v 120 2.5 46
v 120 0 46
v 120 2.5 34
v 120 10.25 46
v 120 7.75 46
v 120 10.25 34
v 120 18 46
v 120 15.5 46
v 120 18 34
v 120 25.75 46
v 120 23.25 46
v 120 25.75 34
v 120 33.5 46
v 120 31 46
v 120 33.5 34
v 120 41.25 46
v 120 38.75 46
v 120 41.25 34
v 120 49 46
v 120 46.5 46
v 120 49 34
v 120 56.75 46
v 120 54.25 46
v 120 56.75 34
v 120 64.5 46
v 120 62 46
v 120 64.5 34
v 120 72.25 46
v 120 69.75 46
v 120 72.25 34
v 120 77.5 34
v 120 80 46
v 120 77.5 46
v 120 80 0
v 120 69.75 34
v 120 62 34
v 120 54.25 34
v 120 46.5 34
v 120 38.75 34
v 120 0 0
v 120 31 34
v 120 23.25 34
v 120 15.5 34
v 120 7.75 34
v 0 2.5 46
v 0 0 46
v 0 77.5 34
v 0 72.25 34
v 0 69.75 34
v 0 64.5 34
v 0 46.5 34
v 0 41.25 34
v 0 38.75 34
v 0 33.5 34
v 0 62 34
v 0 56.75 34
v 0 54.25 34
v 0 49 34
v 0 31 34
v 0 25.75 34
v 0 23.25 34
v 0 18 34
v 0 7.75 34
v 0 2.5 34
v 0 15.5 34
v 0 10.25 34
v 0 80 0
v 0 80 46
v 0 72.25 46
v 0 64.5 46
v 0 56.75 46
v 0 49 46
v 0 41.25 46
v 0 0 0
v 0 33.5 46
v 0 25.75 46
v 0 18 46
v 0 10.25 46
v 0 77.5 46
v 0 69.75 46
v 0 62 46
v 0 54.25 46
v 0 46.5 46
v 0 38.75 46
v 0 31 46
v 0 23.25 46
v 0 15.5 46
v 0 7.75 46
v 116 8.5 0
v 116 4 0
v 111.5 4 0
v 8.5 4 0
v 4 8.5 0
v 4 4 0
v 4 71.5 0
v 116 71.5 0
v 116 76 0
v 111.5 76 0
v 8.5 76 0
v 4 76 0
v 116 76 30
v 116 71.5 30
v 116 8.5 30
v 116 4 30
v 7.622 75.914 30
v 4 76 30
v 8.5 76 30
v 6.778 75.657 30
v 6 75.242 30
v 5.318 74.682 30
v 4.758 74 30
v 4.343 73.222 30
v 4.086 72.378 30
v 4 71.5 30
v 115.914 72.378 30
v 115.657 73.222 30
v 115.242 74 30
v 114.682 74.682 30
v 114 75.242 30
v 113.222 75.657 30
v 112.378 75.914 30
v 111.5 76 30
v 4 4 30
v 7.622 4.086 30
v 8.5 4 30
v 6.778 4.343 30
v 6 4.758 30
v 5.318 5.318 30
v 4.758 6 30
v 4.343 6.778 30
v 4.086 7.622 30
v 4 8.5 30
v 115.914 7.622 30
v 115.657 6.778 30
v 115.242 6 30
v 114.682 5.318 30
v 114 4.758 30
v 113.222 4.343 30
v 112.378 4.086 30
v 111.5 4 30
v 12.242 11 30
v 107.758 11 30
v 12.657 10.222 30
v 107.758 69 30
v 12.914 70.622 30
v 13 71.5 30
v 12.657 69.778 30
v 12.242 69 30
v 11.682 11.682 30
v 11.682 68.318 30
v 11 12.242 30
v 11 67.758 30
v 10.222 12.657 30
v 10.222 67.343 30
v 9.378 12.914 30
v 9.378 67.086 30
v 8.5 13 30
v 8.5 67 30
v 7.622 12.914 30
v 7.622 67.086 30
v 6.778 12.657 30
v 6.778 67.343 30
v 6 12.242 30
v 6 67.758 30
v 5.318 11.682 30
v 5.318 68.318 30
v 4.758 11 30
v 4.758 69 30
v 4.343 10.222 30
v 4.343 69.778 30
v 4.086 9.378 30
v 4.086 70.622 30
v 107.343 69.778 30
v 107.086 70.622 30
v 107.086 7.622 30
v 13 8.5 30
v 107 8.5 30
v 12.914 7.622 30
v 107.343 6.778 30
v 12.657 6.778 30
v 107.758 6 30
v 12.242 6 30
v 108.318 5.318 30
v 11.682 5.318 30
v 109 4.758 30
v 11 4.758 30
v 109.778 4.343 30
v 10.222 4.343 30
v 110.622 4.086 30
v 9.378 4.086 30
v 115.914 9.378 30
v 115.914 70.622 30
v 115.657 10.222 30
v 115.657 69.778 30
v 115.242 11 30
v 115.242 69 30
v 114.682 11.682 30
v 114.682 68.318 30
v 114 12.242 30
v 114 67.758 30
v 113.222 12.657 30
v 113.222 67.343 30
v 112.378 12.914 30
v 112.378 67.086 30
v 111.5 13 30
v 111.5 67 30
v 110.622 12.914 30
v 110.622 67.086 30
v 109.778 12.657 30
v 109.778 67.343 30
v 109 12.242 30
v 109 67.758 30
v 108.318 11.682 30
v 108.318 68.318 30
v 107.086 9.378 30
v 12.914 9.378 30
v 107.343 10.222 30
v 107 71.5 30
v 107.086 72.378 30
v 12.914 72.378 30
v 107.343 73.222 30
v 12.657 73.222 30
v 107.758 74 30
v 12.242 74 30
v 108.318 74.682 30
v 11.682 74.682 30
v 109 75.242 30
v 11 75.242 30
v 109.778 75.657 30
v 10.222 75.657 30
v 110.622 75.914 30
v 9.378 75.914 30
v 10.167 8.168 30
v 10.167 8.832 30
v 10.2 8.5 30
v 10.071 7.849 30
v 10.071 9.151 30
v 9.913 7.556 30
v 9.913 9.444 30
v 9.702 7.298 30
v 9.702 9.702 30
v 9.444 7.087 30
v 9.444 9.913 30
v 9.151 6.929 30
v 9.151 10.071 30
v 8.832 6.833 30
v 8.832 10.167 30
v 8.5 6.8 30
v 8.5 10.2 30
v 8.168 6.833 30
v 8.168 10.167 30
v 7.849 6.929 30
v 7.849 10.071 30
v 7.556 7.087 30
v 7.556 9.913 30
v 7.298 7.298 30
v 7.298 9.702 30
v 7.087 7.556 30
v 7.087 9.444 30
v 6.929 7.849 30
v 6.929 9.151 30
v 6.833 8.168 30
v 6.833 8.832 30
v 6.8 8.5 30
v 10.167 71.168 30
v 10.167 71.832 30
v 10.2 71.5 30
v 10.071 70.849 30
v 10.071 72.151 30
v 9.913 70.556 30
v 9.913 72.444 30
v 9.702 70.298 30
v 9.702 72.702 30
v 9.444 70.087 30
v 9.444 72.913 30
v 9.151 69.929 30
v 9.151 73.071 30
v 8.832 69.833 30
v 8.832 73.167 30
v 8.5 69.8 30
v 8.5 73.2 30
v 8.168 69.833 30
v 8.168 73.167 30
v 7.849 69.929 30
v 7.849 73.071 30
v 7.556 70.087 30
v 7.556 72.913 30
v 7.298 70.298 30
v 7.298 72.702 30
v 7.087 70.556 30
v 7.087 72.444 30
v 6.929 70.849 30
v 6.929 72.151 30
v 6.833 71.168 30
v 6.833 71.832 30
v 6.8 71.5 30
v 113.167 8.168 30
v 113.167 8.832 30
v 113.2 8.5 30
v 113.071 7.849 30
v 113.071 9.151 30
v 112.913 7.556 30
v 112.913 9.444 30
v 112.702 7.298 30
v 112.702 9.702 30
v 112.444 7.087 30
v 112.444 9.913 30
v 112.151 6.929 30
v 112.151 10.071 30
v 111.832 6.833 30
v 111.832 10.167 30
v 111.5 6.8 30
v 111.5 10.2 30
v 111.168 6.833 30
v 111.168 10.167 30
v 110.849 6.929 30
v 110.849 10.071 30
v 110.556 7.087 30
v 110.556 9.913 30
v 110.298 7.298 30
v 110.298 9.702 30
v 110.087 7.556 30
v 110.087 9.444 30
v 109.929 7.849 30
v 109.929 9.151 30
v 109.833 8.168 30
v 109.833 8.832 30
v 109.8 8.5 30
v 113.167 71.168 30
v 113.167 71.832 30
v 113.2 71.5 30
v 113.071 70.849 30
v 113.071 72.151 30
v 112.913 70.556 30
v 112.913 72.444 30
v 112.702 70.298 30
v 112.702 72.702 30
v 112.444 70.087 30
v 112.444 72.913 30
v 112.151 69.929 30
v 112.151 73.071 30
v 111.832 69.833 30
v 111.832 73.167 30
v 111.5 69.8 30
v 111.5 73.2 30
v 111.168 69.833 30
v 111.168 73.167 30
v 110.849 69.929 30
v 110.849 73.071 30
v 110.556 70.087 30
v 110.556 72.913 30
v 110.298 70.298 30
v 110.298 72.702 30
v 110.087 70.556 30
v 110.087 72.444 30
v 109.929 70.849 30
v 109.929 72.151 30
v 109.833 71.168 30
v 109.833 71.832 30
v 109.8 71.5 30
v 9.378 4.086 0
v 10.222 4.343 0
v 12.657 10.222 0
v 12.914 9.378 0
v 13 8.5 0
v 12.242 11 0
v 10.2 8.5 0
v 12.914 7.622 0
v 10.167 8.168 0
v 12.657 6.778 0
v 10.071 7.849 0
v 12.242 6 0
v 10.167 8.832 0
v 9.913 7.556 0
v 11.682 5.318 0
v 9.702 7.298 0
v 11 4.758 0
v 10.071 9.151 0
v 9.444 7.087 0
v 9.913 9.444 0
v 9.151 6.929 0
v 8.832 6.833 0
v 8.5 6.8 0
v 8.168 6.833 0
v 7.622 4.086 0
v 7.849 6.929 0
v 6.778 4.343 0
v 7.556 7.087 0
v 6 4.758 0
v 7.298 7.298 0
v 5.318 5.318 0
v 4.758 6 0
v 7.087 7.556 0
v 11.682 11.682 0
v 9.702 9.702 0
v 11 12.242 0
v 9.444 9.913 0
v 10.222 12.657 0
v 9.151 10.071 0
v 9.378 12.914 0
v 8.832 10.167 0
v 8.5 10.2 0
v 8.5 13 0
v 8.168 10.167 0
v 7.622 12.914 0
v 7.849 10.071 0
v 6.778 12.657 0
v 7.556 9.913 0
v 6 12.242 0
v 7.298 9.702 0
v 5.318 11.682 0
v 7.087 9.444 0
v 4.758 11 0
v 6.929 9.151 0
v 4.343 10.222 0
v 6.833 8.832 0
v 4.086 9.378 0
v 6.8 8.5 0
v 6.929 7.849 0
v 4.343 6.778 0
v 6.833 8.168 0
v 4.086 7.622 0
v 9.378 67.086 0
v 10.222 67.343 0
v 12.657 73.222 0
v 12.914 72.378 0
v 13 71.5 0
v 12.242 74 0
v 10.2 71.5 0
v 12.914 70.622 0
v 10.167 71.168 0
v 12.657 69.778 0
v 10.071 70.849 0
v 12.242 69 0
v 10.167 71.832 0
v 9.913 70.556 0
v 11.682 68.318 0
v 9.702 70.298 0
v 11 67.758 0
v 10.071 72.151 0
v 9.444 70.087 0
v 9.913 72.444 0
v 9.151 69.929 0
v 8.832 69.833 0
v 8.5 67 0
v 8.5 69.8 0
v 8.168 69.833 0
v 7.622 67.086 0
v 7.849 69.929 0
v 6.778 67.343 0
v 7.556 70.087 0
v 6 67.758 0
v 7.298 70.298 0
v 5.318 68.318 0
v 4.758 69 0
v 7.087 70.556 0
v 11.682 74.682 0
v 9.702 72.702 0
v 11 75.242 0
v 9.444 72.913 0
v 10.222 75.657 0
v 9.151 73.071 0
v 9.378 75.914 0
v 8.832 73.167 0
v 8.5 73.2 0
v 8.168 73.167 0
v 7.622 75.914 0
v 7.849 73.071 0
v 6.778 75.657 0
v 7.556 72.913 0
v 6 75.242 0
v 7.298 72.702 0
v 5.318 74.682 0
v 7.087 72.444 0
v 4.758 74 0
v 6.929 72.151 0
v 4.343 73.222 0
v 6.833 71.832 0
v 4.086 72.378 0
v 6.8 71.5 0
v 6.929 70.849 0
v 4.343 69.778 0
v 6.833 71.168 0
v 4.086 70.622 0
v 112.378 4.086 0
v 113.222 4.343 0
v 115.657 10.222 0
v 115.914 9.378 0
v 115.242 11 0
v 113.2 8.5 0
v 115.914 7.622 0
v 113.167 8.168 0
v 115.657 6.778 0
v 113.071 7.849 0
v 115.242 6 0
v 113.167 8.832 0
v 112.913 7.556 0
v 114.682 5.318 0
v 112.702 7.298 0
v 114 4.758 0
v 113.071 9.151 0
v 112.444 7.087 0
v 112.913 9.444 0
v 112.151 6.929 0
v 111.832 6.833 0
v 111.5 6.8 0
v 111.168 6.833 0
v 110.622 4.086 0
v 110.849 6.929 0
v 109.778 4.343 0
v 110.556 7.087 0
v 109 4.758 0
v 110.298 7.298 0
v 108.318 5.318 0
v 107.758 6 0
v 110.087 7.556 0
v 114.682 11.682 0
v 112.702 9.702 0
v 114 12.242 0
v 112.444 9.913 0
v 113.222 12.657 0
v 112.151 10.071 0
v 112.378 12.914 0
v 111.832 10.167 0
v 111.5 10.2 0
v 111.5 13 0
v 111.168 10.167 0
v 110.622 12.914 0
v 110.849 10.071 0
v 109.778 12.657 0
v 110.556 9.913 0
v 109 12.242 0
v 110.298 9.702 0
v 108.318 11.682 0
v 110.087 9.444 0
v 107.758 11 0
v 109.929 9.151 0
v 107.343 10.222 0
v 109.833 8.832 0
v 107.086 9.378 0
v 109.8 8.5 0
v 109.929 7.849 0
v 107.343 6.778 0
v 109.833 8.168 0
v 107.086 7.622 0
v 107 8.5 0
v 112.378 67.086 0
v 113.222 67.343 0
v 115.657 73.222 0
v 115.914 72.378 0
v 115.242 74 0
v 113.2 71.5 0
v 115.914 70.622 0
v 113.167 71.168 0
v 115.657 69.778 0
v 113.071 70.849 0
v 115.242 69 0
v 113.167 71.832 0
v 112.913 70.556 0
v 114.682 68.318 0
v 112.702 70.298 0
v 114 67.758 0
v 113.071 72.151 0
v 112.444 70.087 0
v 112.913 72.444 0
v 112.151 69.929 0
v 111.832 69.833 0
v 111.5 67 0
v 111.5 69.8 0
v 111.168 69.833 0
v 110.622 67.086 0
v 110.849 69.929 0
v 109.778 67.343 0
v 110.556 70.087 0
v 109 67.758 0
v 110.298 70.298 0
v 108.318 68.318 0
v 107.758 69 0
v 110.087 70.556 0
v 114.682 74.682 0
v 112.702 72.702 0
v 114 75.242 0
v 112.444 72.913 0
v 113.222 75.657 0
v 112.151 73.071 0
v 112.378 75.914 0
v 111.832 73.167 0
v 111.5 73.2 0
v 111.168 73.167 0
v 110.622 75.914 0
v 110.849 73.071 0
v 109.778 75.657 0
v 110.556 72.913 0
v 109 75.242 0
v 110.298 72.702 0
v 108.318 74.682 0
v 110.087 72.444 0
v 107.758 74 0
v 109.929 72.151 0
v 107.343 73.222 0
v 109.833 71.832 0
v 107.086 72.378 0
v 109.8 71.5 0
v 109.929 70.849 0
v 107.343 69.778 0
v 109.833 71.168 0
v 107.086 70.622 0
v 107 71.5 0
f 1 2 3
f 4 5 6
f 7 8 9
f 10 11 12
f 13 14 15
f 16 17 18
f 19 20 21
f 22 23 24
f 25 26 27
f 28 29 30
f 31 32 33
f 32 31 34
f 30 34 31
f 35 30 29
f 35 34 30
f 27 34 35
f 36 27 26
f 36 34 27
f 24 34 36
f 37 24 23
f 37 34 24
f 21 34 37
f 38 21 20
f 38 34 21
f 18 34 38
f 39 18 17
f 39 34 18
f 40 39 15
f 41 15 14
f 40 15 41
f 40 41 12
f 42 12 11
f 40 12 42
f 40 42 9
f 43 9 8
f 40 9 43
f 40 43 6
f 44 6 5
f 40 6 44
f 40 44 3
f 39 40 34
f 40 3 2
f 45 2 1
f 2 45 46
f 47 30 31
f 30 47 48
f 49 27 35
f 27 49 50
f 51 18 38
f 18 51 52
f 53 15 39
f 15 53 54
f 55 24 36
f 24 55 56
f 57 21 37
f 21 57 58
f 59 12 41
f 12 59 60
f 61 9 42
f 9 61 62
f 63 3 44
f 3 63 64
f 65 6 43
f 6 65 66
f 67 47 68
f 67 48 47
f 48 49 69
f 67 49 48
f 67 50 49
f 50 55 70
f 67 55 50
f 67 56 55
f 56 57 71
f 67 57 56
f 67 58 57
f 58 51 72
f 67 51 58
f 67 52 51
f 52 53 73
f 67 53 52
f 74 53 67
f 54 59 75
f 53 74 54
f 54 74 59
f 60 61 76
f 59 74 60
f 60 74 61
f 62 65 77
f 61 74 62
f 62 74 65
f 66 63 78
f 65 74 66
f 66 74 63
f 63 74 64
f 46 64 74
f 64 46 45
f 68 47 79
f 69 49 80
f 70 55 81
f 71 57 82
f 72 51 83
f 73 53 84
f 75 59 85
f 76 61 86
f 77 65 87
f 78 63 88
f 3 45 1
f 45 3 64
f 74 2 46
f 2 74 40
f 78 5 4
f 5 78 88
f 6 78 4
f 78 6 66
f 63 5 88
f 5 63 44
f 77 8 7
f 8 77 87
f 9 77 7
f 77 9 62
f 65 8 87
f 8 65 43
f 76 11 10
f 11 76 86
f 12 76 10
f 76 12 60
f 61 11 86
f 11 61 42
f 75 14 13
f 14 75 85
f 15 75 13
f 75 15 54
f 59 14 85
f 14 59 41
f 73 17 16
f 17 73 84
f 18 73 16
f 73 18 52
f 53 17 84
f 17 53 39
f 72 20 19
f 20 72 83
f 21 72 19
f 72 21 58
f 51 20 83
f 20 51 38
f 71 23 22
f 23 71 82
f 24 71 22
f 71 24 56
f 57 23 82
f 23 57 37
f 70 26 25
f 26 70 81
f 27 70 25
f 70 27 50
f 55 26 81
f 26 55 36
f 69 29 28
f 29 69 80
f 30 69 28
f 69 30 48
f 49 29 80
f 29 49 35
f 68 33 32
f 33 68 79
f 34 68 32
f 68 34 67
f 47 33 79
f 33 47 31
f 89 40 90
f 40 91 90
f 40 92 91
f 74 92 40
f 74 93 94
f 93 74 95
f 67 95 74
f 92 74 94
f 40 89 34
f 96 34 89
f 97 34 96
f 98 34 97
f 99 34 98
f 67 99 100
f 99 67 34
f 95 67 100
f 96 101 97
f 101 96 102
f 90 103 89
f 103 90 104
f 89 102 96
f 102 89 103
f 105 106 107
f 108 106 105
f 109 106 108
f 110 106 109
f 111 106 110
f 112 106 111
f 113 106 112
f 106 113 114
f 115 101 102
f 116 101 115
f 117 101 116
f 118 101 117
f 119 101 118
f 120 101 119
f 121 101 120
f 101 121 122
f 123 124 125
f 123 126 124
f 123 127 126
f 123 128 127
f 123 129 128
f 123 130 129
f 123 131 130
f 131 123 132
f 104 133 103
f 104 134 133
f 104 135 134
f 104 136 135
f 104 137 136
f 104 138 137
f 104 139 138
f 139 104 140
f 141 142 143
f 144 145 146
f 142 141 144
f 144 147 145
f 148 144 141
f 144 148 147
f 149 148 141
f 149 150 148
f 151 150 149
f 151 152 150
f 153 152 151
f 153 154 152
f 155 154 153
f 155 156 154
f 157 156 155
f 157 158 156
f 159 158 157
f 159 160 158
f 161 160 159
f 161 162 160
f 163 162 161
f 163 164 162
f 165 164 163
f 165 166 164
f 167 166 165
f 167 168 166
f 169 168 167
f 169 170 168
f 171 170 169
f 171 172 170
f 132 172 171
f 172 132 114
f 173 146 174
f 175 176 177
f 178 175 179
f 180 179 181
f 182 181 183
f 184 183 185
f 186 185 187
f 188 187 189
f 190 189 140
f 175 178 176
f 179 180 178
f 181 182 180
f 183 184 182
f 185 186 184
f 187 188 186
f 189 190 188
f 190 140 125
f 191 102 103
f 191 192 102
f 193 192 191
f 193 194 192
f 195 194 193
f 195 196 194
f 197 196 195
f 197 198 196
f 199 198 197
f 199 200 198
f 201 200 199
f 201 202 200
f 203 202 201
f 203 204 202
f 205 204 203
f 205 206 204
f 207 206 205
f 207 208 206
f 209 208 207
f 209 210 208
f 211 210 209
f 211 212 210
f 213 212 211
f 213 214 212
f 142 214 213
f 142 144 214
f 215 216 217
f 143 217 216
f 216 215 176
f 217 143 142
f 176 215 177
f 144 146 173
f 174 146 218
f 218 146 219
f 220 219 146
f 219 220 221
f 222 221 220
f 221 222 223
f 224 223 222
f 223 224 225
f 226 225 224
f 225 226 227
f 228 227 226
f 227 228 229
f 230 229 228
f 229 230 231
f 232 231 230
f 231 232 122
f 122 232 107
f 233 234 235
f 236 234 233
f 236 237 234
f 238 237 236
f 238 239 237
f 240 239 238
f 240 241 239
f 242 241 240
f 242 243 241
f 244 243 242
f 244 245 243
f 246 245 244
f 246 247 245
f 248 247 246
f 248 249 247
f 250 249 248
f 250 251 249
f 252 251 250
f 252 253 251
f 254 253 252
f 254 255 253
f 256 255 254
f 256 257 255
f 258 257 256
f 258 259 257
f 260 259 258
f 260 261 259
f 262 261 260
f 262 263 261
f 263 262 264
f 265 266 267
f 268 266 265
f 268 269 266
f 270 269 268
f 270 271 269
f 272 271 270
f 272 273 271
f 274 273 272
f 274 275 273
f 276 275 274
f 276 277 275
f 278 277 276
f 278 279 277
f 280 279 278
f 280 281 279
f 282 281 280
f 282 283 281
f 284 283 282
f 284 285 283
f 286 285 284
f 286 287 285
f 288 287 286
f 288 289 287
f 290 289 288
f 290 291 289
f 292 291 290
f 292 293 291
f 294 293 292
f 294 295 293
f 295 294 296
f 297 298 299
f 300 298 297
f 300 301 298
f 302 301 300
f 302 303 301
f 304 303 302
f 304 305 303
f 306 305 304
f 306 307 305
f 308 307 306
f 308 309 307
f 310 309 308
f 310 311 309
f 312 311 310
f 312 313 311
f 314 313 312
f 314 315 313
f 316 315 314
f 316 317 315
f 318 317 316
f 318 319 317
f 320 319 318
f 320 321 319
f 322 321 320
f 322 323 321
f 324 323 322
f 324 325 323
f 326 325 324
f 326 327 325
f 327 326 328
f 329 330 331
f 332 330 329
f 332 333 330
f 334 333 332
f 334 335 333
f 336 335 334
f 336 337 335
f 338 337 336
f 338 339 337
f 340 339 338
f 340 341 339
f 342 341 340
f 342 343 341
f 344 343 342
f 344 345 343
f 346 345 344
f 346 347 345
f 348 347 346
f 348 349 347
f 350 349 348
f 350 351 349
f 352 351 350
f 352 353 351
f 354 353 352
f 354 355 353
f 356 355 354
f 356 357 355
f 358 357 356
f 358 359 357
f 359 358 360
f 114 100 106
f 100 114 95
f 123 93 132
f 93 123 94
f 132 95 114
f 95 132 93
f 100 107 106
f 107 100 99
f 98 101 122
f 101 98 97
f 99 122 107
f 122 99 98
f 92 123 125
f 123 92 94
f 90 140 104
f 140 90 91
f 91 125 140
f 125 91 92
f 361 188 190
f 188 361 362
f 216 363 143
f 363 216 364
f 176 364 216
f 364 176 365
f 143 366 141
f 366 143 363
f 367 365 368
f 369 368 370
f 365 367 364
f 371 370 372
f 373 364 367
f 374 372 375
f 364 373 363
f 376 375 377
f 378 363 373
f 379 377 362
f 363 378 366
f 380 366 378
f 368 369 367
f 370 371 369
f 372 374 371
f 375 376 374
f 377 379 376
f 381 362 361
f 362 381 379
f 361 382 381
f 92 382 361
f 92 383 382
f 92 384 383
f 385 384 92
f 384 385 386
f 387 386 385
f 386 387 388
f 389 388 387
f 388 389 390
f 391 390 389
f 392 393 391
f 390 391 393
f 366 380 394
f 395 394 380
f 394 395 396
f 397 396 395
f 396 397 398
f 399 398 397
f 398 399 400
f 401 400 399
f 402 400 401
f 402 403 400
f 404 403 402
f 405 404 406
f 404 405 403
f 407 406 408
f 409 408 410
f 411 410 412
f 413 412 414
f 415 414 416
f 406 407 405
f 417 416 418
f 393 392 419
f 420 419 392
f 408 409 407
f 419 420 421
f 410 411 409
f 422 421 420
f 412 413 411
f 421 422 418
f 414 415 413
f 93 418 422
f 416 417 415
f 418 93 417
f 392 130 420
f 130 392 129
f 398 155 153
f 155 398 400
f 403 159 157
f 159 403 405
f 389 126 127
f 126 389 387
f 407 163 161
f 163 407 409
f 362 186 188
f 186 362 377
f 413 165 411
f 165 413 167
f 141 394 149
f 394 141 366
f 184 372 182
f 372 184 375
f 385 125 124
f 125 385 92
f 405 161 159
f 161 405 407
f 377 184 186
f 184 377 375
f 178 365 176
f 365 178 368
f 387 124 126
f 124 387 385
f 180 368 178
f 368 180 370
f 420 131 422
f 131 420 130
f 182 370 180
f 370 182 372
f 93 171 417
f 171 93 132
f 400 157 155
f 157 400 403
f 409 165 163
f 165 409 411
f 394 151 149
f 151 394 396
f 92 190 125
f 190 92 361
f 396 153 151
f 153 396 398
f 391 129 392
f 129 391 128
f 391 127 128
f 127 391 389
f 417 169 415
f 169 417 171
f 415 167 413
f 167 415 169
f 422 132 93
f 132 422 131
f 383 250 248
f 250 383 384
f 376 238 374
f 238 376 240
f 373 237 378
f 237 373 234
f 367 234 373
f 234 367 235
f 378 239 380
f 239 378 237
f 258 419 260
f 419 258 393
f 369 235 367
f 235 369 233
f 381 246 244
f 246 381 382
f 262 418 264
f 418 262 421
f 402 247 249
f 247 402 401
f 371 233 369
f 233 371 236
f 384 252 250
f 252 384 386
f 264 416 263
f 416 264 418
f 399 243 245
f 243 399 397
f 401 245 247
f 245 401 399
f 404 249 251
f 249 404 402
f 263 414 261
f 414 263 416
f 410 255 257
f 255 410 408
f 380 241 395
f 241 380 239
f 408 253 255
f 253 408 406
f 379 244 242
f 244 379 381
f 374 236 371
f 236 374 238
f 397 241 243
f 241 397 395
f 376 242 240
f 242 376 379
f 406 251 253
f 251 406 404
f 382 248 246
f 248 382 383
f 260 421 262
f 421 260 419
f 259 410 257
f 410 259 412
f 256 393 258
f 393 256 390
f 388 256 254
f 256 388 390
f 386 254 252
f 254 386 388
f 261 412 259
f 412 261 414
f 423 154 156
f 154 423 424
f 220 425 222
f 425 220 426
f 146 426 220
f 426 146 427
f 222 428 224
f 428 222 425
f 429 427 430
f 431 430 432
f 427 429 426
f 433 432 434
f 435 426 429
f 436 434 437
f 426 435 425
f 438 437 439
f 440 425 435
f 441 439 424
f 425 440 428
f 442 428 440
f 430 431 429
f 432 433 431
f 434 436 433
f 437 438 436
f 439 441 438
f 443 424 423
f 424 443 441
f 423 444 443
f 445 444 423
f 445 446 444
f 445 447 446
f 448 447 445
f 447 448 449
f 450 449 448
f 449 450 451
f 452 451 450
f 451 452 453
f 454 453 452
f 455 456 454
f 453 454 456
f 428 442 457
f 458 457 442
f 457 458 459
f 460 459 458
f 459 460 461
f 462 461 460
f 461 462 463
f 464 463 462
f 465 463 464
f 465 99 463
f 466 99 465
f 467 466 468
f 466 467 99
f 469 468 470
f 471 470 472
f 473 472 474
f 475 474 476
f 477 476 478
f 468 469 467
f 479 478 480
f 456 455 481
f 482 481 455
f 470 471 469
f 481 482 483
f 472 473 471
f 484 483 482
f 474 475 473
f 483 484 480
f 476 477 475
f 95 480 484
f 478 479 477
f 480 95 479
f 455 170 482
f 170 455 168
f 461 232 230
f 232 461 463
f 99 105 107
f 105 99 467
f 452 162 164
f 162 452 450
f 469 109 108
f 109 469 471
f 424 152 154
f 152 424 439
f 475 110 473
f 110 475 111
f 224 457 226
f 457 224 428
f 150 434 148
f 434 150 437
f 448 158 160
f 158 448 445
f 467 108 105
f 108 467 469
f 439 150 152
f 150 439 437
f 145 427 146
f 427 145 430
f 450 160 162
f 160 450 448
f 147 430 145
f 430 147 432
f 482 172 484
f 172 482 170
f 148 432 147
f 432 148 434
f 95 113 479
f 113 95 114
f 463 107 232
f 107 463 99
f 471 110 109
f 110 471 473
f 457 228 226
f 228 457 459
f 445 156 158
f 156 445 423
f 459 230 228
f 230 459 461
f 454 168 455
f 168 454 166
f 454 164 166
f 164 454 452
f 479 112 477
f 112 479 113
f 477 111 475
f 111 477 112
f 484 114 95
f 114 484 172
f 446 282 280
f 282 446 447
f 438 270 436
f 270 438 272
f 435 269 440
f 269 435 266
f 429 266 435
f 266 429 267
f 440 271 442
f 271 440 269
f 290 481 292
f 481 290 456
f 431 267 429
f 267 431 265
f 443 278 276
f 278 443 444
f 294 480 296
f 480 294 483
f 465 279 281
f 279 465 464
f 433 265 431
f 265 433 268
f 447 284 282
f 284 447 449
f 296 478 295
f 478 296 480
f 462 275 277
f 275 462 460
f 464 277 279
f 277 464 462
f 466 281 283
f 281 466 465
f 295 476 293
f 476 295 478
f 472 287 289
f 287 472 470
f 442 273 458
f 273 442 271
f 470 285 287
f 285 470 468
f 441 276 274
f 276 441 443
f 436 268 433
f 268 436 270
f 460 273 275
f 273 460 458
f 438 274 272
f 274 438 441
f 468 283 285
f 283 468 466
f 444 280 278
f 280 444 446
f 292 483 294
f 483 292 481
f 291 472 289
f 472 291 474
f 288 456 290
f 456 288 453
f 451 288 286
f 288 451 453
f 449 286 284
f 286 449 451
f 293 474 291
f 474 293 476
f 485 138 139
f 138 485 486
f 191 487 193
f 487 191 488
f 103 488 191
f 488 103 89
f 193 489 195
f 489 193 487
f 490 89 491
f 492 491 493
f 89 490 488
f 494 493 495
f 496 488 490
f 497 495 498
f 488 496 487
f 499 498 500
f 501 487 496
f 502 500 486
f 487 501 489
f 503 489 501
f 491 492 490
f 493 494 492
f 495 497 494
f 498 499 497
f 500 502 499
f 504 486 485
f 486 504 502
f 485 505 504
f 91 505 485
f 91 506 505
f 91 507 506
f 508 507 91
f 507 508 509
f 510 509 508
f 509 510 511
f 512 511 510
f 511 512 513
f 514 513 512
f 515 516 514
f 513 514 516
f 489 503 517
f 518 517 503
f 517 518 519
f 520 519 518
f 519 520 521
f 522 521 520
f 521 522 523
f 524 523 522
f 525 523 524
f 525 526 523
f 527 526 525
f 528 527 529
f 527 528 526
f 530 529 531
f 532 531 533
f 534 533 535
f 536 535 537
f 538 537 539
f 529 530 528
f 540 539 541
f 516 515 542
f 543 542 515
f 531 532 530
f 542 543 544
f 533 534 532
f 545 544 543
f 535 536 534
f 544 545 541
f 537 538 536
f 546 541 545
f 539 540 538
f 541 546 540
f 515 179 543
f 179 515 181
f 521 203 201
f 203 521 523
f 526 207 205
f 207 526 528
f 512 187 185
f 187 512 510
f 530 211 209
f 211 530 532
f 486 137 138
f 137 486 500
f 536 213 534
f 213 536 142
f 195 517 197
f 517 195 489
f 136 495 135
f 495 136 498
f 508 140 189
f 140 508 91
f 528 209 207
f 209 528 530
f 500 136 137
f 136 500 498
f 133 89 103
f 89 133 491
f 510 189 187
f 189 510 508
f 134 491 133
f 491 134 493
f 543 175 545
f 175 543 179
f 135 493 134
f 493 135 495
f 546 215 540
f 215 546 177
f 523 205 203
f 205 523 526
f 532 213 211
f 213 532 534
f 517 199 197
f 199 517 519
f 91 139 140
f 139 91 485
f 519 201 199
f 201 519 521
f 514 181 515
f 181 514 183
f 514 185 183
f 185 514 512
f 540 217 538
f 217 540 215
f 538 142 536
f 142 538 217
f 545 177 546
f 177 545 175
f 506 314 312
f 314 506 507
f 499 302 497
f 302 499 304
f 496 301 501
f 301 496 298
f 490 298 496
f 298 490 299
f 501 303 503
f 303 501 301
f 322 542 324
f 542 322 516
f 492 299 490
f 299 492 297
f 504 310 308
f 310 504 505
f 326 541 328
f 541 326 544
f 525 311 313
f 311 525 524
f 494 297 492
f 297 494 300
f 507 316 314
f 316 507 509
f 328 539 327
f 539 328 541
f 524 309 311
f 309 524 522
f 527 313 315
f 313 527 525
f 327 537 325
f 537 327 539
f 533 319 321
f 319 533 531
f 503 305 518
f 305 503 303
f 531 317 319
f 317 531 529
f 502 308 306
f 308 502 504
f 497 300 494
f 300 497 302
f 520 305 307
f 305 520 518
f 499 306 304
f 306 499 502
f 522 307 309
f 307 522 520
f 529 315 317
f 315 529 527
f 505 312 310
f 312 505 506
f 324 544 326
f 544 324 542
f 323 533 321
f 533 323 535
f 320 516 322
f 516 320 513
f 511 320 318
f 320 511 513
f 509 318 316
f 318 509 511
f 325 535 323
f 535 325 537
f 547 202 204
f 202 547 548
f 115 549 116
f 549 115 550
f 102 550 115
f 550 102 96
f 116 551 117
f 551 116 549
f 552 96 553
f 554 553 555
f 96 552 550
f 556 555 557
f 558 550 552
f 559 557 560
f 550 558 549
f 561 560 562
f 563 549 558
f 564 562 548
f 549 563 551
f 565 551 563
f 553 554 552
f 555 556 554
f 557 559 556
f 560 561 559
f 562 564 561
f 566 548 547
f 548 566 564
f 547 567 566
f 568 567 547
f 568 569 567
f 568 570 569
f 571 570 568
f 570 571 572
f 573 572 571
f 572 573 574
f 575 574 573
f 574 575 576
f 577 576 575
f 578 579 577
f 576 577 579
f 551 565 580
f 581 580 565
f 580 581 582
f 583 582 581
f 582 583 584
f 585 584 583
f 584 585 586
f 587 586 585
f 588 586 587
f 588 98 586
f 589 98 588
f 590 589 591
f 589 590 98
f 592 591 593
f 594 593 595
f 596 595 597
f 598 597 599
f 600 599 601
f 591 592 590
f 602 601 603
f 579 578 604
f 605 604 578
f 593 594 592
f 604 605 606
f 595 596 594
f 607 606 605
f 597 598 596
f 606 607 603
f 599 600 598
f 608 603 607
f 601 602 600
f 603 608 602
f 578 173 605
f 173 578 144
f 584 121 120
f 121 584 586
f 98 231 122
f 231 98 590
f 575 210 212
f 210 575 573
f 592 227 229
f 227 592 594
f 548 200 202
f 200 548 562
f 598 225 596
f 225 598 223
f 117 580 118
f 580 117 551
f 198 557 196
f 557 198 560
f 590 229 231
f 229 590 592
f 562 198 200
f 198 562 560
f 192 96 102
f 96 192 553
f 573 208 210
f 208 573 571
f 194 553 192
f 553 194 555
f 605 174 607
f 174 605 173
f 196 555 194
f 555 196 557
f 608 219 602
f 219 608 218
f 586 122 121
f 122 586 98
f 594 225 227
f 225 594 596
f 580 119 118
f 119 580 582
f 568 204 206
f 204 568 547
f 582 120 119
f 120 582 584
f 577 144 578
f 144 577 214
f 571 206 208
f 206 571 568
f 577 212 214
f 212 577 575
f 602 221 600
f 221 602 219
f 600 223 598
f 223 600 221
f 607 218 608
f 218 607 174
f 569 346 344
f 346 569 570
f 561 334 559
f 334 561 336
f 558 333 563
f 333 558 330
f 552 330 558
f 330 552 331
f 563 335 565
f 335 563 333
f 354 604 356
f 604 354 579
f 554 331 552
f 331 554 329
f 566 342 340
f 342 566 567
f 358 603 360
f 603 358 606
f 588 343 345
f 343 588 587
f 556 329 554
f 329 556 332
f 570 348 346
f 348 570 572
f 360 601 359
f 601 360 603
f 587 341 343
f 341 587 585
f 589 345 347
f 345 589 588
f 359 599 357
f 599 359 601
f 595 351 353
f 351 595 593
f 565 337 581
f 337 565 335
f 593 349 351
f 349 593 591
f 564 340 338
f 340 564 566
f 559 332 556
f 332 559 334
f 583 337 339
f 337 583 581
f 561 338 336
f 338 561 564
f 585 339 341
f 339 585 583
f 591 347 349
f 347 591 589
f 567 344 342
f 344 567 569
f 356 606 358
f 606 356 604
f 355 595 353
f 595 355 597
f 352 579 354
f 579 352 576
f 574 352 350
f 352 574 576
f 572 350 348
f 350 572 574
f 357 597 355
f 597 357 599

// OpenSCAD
// Finned Power-Electronics Heatsink Enclosure (mm)
$fn = 32;

box_len = 120;
box_wid = 80;
box_h = 34;
wall_t = 4;
fin_count = 11;
fin_t = 2.5;
fin_h = 12;
boss_r = 4.5;
screw_r = 1.7;

function fin_pitch(total_w, n, t) = (total_w - t) / (n - 1);

module heatsink_enclosure() {
  pitch = fin_pitch(box_wid, fin_count, fin_t);
  difference() {
    union() {
      cube([box_len, box_wid, box_h]);
      for (i = [0 : fin_count - 1]) {
        translate([0, i * pitch, box_h])
          cube([box_len, fin_t, fin_h]);
      }
    }
    translate([wall_t, wall_t, -1])
      cube([box_len - 2 * wall_t, box_wid - 2 * wall_t, box_h - wall_t + 1]);
  }

  for (x = [wall_t + boss_r, box_len - wall_t - boss_r]) {
    for (y = [wall_t + boss_r, box_wid - wall_t - boss_r]) {
      difference() {
        translate([x, y, 0])
          cylinder(r = boss_r, h = box_h - wall_t);
        translate([x, y, -1])
          cylinder(r = screw_r, h = box_h);
      }
    }
  }
}

heatsink_enclosure();
